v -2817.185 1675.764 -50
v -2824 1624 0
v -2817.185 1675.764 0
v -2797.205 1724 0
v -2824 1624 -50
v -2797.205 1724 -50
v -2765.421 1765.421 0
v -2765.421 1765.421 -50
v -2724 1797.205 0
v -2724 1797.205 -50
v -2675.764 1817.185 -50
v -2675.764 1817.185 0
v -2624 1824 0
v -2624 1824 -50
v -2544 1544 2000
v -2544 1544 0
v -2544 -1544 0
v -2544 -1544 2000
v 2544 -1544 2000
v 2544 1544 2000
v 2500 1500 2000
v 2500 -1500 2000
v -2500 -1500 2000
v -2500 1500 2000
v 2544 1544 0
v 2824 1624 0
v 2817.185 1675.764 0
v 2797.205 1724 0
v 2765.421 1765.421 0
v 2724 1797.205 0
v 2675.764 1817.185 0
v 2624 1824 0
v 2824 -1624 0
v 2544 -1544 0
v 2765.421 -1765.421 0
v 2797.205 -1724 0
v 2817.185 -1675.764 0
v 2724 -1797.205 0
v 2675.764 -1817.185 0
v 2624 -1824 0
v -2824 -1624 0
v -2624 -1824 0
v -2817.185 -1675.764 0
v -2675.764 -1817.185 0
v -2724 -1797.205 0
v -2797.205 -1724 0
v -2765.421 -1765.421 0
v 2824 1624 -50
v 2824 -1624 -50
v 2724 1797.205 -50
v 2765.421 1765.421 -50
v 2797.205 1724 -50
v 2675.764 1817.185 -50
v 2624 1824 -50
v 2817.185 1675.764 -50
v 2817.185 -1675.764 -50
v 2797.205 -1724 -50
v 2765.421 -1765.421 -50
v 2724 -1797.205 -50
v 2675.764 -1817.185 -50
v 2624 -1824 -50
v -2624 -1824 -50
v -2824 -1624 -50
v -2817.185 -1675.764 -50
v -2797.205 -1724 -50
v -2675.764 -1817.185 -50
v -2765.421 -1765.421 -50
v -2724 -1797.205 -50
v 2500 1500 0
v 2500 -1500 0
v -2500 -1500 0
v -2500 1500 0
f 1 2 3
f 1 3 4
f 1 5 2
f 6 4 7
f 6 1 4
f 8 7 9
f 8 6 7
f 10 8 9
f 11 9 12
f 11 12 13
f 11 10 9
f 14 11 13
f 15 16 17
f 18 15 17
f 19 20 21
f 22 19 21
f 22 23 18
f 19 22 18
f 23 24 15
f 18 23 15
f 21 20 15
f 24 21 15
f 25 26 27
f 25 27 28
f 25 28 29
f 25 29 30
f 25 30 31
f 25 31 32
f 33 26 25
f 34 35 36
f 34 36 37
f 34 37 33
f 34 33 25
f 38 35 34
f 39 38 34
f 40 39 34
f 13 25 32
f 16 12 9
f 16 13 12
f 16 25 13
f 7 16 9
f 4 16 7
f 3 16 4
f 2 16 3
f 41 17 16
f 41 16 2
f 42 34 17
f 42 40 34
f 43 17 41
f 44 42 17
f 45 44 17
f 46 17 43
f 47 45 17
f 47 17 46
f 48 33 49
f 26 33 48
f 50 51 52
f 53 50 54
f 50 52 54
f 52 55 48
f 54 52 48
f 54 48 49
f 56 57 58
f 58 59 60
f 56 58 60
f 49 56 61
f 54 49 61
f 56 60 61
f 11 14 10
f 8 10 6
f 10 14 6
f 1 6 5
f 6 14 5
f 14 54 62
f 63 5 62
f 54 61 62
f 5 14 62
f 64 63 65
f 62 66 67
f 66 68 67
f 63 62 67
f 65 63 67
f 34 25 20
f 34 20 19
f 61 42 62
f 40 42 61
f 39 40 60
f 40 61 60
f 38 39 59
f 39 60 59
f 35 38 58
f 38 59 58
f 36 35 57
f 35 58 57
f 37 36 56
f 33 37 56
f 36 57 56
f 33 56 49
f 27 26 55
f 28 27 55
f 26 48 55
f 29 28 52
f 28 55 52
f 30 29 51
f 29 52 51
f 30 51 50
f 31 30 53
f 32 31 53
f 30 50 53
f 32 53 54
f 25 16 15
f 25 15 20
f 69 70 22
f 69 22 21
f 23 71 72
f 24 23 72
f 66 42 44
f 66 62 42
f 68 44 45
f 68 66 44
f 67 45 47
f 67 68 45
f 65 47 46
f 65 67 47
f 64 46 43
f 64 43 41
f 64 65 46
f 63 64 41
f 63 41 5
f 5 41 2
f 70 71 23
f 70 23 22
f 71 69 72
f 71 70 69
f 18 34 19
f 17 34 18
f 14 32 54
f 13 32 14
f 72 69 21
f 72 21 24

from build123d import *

# Parameters (mm, degrees)
F1_DEPTH = 2000
F2_W     = 2500
F2_H     = 3000
F3_DEPTH = 50
F4_R     = 200


with BuildPart() as f1:
    # F0 (on Top) → F1 (new body)
    with BuildSketch(Plane.XY):
        Polygon((-2500, -1500), (-2500, 1500), (-2544, 1544), (-2544, -1544), align=None)
        Polygon((-2544, 1544), (-2500, 1500), (0, 1500), (0, 1544), align=None)
        Polygon((0, -1500), (-2500, -1500), (-2544, -1544), (0, -1544), align=None)
    extrude(amount=F1_DEPTH)

    # F2 (on face) → F3 (join)
    with BuildSketch(Plane(origin=(0, 0, 0), x_dir=(1, 0, 0), z_dir=(0, 0, -1))):
        Polygon((0, 1823.9998817444), (-2823.9998817444, 1823.9998817444), (-2823.9998817444, -1823.9998817444), (0, -1823.9998817444), (0, -1544), (-2544, -1544), (-2544, 1544), (0, 1544), align=None)
        with Locations((-1250, 0)):
            Rectangle(F2_W, F2_H)
        Polygon((0, 1500), (0, 1544), (-2544, 1544), (-2544, -1544), (0, -1544), (0, -1500), (-2500, -1500), (-2500, 1500), align=None)
    extrude(amount=F3_DEPTH)

    # F4
    f4_edges = [f1.edges().sort_by_distance(p)[0] for p in [
        (-2823.999882, -1823.999882, -25),
        (-2823.999882, 1823.999882, -25),
    ]]
    fillet(f4_edges, radius=F4_R)

    # F5: F1 across face


with BuildPart() as f1_1:
    add(f1.part)
    add(f1.part.mirror(Plane(origin=(0, 0, 478.3482308939), x_dir=(0, 1, 0), z_dir=(1, 0, 0))))


solid = f1_1.part
